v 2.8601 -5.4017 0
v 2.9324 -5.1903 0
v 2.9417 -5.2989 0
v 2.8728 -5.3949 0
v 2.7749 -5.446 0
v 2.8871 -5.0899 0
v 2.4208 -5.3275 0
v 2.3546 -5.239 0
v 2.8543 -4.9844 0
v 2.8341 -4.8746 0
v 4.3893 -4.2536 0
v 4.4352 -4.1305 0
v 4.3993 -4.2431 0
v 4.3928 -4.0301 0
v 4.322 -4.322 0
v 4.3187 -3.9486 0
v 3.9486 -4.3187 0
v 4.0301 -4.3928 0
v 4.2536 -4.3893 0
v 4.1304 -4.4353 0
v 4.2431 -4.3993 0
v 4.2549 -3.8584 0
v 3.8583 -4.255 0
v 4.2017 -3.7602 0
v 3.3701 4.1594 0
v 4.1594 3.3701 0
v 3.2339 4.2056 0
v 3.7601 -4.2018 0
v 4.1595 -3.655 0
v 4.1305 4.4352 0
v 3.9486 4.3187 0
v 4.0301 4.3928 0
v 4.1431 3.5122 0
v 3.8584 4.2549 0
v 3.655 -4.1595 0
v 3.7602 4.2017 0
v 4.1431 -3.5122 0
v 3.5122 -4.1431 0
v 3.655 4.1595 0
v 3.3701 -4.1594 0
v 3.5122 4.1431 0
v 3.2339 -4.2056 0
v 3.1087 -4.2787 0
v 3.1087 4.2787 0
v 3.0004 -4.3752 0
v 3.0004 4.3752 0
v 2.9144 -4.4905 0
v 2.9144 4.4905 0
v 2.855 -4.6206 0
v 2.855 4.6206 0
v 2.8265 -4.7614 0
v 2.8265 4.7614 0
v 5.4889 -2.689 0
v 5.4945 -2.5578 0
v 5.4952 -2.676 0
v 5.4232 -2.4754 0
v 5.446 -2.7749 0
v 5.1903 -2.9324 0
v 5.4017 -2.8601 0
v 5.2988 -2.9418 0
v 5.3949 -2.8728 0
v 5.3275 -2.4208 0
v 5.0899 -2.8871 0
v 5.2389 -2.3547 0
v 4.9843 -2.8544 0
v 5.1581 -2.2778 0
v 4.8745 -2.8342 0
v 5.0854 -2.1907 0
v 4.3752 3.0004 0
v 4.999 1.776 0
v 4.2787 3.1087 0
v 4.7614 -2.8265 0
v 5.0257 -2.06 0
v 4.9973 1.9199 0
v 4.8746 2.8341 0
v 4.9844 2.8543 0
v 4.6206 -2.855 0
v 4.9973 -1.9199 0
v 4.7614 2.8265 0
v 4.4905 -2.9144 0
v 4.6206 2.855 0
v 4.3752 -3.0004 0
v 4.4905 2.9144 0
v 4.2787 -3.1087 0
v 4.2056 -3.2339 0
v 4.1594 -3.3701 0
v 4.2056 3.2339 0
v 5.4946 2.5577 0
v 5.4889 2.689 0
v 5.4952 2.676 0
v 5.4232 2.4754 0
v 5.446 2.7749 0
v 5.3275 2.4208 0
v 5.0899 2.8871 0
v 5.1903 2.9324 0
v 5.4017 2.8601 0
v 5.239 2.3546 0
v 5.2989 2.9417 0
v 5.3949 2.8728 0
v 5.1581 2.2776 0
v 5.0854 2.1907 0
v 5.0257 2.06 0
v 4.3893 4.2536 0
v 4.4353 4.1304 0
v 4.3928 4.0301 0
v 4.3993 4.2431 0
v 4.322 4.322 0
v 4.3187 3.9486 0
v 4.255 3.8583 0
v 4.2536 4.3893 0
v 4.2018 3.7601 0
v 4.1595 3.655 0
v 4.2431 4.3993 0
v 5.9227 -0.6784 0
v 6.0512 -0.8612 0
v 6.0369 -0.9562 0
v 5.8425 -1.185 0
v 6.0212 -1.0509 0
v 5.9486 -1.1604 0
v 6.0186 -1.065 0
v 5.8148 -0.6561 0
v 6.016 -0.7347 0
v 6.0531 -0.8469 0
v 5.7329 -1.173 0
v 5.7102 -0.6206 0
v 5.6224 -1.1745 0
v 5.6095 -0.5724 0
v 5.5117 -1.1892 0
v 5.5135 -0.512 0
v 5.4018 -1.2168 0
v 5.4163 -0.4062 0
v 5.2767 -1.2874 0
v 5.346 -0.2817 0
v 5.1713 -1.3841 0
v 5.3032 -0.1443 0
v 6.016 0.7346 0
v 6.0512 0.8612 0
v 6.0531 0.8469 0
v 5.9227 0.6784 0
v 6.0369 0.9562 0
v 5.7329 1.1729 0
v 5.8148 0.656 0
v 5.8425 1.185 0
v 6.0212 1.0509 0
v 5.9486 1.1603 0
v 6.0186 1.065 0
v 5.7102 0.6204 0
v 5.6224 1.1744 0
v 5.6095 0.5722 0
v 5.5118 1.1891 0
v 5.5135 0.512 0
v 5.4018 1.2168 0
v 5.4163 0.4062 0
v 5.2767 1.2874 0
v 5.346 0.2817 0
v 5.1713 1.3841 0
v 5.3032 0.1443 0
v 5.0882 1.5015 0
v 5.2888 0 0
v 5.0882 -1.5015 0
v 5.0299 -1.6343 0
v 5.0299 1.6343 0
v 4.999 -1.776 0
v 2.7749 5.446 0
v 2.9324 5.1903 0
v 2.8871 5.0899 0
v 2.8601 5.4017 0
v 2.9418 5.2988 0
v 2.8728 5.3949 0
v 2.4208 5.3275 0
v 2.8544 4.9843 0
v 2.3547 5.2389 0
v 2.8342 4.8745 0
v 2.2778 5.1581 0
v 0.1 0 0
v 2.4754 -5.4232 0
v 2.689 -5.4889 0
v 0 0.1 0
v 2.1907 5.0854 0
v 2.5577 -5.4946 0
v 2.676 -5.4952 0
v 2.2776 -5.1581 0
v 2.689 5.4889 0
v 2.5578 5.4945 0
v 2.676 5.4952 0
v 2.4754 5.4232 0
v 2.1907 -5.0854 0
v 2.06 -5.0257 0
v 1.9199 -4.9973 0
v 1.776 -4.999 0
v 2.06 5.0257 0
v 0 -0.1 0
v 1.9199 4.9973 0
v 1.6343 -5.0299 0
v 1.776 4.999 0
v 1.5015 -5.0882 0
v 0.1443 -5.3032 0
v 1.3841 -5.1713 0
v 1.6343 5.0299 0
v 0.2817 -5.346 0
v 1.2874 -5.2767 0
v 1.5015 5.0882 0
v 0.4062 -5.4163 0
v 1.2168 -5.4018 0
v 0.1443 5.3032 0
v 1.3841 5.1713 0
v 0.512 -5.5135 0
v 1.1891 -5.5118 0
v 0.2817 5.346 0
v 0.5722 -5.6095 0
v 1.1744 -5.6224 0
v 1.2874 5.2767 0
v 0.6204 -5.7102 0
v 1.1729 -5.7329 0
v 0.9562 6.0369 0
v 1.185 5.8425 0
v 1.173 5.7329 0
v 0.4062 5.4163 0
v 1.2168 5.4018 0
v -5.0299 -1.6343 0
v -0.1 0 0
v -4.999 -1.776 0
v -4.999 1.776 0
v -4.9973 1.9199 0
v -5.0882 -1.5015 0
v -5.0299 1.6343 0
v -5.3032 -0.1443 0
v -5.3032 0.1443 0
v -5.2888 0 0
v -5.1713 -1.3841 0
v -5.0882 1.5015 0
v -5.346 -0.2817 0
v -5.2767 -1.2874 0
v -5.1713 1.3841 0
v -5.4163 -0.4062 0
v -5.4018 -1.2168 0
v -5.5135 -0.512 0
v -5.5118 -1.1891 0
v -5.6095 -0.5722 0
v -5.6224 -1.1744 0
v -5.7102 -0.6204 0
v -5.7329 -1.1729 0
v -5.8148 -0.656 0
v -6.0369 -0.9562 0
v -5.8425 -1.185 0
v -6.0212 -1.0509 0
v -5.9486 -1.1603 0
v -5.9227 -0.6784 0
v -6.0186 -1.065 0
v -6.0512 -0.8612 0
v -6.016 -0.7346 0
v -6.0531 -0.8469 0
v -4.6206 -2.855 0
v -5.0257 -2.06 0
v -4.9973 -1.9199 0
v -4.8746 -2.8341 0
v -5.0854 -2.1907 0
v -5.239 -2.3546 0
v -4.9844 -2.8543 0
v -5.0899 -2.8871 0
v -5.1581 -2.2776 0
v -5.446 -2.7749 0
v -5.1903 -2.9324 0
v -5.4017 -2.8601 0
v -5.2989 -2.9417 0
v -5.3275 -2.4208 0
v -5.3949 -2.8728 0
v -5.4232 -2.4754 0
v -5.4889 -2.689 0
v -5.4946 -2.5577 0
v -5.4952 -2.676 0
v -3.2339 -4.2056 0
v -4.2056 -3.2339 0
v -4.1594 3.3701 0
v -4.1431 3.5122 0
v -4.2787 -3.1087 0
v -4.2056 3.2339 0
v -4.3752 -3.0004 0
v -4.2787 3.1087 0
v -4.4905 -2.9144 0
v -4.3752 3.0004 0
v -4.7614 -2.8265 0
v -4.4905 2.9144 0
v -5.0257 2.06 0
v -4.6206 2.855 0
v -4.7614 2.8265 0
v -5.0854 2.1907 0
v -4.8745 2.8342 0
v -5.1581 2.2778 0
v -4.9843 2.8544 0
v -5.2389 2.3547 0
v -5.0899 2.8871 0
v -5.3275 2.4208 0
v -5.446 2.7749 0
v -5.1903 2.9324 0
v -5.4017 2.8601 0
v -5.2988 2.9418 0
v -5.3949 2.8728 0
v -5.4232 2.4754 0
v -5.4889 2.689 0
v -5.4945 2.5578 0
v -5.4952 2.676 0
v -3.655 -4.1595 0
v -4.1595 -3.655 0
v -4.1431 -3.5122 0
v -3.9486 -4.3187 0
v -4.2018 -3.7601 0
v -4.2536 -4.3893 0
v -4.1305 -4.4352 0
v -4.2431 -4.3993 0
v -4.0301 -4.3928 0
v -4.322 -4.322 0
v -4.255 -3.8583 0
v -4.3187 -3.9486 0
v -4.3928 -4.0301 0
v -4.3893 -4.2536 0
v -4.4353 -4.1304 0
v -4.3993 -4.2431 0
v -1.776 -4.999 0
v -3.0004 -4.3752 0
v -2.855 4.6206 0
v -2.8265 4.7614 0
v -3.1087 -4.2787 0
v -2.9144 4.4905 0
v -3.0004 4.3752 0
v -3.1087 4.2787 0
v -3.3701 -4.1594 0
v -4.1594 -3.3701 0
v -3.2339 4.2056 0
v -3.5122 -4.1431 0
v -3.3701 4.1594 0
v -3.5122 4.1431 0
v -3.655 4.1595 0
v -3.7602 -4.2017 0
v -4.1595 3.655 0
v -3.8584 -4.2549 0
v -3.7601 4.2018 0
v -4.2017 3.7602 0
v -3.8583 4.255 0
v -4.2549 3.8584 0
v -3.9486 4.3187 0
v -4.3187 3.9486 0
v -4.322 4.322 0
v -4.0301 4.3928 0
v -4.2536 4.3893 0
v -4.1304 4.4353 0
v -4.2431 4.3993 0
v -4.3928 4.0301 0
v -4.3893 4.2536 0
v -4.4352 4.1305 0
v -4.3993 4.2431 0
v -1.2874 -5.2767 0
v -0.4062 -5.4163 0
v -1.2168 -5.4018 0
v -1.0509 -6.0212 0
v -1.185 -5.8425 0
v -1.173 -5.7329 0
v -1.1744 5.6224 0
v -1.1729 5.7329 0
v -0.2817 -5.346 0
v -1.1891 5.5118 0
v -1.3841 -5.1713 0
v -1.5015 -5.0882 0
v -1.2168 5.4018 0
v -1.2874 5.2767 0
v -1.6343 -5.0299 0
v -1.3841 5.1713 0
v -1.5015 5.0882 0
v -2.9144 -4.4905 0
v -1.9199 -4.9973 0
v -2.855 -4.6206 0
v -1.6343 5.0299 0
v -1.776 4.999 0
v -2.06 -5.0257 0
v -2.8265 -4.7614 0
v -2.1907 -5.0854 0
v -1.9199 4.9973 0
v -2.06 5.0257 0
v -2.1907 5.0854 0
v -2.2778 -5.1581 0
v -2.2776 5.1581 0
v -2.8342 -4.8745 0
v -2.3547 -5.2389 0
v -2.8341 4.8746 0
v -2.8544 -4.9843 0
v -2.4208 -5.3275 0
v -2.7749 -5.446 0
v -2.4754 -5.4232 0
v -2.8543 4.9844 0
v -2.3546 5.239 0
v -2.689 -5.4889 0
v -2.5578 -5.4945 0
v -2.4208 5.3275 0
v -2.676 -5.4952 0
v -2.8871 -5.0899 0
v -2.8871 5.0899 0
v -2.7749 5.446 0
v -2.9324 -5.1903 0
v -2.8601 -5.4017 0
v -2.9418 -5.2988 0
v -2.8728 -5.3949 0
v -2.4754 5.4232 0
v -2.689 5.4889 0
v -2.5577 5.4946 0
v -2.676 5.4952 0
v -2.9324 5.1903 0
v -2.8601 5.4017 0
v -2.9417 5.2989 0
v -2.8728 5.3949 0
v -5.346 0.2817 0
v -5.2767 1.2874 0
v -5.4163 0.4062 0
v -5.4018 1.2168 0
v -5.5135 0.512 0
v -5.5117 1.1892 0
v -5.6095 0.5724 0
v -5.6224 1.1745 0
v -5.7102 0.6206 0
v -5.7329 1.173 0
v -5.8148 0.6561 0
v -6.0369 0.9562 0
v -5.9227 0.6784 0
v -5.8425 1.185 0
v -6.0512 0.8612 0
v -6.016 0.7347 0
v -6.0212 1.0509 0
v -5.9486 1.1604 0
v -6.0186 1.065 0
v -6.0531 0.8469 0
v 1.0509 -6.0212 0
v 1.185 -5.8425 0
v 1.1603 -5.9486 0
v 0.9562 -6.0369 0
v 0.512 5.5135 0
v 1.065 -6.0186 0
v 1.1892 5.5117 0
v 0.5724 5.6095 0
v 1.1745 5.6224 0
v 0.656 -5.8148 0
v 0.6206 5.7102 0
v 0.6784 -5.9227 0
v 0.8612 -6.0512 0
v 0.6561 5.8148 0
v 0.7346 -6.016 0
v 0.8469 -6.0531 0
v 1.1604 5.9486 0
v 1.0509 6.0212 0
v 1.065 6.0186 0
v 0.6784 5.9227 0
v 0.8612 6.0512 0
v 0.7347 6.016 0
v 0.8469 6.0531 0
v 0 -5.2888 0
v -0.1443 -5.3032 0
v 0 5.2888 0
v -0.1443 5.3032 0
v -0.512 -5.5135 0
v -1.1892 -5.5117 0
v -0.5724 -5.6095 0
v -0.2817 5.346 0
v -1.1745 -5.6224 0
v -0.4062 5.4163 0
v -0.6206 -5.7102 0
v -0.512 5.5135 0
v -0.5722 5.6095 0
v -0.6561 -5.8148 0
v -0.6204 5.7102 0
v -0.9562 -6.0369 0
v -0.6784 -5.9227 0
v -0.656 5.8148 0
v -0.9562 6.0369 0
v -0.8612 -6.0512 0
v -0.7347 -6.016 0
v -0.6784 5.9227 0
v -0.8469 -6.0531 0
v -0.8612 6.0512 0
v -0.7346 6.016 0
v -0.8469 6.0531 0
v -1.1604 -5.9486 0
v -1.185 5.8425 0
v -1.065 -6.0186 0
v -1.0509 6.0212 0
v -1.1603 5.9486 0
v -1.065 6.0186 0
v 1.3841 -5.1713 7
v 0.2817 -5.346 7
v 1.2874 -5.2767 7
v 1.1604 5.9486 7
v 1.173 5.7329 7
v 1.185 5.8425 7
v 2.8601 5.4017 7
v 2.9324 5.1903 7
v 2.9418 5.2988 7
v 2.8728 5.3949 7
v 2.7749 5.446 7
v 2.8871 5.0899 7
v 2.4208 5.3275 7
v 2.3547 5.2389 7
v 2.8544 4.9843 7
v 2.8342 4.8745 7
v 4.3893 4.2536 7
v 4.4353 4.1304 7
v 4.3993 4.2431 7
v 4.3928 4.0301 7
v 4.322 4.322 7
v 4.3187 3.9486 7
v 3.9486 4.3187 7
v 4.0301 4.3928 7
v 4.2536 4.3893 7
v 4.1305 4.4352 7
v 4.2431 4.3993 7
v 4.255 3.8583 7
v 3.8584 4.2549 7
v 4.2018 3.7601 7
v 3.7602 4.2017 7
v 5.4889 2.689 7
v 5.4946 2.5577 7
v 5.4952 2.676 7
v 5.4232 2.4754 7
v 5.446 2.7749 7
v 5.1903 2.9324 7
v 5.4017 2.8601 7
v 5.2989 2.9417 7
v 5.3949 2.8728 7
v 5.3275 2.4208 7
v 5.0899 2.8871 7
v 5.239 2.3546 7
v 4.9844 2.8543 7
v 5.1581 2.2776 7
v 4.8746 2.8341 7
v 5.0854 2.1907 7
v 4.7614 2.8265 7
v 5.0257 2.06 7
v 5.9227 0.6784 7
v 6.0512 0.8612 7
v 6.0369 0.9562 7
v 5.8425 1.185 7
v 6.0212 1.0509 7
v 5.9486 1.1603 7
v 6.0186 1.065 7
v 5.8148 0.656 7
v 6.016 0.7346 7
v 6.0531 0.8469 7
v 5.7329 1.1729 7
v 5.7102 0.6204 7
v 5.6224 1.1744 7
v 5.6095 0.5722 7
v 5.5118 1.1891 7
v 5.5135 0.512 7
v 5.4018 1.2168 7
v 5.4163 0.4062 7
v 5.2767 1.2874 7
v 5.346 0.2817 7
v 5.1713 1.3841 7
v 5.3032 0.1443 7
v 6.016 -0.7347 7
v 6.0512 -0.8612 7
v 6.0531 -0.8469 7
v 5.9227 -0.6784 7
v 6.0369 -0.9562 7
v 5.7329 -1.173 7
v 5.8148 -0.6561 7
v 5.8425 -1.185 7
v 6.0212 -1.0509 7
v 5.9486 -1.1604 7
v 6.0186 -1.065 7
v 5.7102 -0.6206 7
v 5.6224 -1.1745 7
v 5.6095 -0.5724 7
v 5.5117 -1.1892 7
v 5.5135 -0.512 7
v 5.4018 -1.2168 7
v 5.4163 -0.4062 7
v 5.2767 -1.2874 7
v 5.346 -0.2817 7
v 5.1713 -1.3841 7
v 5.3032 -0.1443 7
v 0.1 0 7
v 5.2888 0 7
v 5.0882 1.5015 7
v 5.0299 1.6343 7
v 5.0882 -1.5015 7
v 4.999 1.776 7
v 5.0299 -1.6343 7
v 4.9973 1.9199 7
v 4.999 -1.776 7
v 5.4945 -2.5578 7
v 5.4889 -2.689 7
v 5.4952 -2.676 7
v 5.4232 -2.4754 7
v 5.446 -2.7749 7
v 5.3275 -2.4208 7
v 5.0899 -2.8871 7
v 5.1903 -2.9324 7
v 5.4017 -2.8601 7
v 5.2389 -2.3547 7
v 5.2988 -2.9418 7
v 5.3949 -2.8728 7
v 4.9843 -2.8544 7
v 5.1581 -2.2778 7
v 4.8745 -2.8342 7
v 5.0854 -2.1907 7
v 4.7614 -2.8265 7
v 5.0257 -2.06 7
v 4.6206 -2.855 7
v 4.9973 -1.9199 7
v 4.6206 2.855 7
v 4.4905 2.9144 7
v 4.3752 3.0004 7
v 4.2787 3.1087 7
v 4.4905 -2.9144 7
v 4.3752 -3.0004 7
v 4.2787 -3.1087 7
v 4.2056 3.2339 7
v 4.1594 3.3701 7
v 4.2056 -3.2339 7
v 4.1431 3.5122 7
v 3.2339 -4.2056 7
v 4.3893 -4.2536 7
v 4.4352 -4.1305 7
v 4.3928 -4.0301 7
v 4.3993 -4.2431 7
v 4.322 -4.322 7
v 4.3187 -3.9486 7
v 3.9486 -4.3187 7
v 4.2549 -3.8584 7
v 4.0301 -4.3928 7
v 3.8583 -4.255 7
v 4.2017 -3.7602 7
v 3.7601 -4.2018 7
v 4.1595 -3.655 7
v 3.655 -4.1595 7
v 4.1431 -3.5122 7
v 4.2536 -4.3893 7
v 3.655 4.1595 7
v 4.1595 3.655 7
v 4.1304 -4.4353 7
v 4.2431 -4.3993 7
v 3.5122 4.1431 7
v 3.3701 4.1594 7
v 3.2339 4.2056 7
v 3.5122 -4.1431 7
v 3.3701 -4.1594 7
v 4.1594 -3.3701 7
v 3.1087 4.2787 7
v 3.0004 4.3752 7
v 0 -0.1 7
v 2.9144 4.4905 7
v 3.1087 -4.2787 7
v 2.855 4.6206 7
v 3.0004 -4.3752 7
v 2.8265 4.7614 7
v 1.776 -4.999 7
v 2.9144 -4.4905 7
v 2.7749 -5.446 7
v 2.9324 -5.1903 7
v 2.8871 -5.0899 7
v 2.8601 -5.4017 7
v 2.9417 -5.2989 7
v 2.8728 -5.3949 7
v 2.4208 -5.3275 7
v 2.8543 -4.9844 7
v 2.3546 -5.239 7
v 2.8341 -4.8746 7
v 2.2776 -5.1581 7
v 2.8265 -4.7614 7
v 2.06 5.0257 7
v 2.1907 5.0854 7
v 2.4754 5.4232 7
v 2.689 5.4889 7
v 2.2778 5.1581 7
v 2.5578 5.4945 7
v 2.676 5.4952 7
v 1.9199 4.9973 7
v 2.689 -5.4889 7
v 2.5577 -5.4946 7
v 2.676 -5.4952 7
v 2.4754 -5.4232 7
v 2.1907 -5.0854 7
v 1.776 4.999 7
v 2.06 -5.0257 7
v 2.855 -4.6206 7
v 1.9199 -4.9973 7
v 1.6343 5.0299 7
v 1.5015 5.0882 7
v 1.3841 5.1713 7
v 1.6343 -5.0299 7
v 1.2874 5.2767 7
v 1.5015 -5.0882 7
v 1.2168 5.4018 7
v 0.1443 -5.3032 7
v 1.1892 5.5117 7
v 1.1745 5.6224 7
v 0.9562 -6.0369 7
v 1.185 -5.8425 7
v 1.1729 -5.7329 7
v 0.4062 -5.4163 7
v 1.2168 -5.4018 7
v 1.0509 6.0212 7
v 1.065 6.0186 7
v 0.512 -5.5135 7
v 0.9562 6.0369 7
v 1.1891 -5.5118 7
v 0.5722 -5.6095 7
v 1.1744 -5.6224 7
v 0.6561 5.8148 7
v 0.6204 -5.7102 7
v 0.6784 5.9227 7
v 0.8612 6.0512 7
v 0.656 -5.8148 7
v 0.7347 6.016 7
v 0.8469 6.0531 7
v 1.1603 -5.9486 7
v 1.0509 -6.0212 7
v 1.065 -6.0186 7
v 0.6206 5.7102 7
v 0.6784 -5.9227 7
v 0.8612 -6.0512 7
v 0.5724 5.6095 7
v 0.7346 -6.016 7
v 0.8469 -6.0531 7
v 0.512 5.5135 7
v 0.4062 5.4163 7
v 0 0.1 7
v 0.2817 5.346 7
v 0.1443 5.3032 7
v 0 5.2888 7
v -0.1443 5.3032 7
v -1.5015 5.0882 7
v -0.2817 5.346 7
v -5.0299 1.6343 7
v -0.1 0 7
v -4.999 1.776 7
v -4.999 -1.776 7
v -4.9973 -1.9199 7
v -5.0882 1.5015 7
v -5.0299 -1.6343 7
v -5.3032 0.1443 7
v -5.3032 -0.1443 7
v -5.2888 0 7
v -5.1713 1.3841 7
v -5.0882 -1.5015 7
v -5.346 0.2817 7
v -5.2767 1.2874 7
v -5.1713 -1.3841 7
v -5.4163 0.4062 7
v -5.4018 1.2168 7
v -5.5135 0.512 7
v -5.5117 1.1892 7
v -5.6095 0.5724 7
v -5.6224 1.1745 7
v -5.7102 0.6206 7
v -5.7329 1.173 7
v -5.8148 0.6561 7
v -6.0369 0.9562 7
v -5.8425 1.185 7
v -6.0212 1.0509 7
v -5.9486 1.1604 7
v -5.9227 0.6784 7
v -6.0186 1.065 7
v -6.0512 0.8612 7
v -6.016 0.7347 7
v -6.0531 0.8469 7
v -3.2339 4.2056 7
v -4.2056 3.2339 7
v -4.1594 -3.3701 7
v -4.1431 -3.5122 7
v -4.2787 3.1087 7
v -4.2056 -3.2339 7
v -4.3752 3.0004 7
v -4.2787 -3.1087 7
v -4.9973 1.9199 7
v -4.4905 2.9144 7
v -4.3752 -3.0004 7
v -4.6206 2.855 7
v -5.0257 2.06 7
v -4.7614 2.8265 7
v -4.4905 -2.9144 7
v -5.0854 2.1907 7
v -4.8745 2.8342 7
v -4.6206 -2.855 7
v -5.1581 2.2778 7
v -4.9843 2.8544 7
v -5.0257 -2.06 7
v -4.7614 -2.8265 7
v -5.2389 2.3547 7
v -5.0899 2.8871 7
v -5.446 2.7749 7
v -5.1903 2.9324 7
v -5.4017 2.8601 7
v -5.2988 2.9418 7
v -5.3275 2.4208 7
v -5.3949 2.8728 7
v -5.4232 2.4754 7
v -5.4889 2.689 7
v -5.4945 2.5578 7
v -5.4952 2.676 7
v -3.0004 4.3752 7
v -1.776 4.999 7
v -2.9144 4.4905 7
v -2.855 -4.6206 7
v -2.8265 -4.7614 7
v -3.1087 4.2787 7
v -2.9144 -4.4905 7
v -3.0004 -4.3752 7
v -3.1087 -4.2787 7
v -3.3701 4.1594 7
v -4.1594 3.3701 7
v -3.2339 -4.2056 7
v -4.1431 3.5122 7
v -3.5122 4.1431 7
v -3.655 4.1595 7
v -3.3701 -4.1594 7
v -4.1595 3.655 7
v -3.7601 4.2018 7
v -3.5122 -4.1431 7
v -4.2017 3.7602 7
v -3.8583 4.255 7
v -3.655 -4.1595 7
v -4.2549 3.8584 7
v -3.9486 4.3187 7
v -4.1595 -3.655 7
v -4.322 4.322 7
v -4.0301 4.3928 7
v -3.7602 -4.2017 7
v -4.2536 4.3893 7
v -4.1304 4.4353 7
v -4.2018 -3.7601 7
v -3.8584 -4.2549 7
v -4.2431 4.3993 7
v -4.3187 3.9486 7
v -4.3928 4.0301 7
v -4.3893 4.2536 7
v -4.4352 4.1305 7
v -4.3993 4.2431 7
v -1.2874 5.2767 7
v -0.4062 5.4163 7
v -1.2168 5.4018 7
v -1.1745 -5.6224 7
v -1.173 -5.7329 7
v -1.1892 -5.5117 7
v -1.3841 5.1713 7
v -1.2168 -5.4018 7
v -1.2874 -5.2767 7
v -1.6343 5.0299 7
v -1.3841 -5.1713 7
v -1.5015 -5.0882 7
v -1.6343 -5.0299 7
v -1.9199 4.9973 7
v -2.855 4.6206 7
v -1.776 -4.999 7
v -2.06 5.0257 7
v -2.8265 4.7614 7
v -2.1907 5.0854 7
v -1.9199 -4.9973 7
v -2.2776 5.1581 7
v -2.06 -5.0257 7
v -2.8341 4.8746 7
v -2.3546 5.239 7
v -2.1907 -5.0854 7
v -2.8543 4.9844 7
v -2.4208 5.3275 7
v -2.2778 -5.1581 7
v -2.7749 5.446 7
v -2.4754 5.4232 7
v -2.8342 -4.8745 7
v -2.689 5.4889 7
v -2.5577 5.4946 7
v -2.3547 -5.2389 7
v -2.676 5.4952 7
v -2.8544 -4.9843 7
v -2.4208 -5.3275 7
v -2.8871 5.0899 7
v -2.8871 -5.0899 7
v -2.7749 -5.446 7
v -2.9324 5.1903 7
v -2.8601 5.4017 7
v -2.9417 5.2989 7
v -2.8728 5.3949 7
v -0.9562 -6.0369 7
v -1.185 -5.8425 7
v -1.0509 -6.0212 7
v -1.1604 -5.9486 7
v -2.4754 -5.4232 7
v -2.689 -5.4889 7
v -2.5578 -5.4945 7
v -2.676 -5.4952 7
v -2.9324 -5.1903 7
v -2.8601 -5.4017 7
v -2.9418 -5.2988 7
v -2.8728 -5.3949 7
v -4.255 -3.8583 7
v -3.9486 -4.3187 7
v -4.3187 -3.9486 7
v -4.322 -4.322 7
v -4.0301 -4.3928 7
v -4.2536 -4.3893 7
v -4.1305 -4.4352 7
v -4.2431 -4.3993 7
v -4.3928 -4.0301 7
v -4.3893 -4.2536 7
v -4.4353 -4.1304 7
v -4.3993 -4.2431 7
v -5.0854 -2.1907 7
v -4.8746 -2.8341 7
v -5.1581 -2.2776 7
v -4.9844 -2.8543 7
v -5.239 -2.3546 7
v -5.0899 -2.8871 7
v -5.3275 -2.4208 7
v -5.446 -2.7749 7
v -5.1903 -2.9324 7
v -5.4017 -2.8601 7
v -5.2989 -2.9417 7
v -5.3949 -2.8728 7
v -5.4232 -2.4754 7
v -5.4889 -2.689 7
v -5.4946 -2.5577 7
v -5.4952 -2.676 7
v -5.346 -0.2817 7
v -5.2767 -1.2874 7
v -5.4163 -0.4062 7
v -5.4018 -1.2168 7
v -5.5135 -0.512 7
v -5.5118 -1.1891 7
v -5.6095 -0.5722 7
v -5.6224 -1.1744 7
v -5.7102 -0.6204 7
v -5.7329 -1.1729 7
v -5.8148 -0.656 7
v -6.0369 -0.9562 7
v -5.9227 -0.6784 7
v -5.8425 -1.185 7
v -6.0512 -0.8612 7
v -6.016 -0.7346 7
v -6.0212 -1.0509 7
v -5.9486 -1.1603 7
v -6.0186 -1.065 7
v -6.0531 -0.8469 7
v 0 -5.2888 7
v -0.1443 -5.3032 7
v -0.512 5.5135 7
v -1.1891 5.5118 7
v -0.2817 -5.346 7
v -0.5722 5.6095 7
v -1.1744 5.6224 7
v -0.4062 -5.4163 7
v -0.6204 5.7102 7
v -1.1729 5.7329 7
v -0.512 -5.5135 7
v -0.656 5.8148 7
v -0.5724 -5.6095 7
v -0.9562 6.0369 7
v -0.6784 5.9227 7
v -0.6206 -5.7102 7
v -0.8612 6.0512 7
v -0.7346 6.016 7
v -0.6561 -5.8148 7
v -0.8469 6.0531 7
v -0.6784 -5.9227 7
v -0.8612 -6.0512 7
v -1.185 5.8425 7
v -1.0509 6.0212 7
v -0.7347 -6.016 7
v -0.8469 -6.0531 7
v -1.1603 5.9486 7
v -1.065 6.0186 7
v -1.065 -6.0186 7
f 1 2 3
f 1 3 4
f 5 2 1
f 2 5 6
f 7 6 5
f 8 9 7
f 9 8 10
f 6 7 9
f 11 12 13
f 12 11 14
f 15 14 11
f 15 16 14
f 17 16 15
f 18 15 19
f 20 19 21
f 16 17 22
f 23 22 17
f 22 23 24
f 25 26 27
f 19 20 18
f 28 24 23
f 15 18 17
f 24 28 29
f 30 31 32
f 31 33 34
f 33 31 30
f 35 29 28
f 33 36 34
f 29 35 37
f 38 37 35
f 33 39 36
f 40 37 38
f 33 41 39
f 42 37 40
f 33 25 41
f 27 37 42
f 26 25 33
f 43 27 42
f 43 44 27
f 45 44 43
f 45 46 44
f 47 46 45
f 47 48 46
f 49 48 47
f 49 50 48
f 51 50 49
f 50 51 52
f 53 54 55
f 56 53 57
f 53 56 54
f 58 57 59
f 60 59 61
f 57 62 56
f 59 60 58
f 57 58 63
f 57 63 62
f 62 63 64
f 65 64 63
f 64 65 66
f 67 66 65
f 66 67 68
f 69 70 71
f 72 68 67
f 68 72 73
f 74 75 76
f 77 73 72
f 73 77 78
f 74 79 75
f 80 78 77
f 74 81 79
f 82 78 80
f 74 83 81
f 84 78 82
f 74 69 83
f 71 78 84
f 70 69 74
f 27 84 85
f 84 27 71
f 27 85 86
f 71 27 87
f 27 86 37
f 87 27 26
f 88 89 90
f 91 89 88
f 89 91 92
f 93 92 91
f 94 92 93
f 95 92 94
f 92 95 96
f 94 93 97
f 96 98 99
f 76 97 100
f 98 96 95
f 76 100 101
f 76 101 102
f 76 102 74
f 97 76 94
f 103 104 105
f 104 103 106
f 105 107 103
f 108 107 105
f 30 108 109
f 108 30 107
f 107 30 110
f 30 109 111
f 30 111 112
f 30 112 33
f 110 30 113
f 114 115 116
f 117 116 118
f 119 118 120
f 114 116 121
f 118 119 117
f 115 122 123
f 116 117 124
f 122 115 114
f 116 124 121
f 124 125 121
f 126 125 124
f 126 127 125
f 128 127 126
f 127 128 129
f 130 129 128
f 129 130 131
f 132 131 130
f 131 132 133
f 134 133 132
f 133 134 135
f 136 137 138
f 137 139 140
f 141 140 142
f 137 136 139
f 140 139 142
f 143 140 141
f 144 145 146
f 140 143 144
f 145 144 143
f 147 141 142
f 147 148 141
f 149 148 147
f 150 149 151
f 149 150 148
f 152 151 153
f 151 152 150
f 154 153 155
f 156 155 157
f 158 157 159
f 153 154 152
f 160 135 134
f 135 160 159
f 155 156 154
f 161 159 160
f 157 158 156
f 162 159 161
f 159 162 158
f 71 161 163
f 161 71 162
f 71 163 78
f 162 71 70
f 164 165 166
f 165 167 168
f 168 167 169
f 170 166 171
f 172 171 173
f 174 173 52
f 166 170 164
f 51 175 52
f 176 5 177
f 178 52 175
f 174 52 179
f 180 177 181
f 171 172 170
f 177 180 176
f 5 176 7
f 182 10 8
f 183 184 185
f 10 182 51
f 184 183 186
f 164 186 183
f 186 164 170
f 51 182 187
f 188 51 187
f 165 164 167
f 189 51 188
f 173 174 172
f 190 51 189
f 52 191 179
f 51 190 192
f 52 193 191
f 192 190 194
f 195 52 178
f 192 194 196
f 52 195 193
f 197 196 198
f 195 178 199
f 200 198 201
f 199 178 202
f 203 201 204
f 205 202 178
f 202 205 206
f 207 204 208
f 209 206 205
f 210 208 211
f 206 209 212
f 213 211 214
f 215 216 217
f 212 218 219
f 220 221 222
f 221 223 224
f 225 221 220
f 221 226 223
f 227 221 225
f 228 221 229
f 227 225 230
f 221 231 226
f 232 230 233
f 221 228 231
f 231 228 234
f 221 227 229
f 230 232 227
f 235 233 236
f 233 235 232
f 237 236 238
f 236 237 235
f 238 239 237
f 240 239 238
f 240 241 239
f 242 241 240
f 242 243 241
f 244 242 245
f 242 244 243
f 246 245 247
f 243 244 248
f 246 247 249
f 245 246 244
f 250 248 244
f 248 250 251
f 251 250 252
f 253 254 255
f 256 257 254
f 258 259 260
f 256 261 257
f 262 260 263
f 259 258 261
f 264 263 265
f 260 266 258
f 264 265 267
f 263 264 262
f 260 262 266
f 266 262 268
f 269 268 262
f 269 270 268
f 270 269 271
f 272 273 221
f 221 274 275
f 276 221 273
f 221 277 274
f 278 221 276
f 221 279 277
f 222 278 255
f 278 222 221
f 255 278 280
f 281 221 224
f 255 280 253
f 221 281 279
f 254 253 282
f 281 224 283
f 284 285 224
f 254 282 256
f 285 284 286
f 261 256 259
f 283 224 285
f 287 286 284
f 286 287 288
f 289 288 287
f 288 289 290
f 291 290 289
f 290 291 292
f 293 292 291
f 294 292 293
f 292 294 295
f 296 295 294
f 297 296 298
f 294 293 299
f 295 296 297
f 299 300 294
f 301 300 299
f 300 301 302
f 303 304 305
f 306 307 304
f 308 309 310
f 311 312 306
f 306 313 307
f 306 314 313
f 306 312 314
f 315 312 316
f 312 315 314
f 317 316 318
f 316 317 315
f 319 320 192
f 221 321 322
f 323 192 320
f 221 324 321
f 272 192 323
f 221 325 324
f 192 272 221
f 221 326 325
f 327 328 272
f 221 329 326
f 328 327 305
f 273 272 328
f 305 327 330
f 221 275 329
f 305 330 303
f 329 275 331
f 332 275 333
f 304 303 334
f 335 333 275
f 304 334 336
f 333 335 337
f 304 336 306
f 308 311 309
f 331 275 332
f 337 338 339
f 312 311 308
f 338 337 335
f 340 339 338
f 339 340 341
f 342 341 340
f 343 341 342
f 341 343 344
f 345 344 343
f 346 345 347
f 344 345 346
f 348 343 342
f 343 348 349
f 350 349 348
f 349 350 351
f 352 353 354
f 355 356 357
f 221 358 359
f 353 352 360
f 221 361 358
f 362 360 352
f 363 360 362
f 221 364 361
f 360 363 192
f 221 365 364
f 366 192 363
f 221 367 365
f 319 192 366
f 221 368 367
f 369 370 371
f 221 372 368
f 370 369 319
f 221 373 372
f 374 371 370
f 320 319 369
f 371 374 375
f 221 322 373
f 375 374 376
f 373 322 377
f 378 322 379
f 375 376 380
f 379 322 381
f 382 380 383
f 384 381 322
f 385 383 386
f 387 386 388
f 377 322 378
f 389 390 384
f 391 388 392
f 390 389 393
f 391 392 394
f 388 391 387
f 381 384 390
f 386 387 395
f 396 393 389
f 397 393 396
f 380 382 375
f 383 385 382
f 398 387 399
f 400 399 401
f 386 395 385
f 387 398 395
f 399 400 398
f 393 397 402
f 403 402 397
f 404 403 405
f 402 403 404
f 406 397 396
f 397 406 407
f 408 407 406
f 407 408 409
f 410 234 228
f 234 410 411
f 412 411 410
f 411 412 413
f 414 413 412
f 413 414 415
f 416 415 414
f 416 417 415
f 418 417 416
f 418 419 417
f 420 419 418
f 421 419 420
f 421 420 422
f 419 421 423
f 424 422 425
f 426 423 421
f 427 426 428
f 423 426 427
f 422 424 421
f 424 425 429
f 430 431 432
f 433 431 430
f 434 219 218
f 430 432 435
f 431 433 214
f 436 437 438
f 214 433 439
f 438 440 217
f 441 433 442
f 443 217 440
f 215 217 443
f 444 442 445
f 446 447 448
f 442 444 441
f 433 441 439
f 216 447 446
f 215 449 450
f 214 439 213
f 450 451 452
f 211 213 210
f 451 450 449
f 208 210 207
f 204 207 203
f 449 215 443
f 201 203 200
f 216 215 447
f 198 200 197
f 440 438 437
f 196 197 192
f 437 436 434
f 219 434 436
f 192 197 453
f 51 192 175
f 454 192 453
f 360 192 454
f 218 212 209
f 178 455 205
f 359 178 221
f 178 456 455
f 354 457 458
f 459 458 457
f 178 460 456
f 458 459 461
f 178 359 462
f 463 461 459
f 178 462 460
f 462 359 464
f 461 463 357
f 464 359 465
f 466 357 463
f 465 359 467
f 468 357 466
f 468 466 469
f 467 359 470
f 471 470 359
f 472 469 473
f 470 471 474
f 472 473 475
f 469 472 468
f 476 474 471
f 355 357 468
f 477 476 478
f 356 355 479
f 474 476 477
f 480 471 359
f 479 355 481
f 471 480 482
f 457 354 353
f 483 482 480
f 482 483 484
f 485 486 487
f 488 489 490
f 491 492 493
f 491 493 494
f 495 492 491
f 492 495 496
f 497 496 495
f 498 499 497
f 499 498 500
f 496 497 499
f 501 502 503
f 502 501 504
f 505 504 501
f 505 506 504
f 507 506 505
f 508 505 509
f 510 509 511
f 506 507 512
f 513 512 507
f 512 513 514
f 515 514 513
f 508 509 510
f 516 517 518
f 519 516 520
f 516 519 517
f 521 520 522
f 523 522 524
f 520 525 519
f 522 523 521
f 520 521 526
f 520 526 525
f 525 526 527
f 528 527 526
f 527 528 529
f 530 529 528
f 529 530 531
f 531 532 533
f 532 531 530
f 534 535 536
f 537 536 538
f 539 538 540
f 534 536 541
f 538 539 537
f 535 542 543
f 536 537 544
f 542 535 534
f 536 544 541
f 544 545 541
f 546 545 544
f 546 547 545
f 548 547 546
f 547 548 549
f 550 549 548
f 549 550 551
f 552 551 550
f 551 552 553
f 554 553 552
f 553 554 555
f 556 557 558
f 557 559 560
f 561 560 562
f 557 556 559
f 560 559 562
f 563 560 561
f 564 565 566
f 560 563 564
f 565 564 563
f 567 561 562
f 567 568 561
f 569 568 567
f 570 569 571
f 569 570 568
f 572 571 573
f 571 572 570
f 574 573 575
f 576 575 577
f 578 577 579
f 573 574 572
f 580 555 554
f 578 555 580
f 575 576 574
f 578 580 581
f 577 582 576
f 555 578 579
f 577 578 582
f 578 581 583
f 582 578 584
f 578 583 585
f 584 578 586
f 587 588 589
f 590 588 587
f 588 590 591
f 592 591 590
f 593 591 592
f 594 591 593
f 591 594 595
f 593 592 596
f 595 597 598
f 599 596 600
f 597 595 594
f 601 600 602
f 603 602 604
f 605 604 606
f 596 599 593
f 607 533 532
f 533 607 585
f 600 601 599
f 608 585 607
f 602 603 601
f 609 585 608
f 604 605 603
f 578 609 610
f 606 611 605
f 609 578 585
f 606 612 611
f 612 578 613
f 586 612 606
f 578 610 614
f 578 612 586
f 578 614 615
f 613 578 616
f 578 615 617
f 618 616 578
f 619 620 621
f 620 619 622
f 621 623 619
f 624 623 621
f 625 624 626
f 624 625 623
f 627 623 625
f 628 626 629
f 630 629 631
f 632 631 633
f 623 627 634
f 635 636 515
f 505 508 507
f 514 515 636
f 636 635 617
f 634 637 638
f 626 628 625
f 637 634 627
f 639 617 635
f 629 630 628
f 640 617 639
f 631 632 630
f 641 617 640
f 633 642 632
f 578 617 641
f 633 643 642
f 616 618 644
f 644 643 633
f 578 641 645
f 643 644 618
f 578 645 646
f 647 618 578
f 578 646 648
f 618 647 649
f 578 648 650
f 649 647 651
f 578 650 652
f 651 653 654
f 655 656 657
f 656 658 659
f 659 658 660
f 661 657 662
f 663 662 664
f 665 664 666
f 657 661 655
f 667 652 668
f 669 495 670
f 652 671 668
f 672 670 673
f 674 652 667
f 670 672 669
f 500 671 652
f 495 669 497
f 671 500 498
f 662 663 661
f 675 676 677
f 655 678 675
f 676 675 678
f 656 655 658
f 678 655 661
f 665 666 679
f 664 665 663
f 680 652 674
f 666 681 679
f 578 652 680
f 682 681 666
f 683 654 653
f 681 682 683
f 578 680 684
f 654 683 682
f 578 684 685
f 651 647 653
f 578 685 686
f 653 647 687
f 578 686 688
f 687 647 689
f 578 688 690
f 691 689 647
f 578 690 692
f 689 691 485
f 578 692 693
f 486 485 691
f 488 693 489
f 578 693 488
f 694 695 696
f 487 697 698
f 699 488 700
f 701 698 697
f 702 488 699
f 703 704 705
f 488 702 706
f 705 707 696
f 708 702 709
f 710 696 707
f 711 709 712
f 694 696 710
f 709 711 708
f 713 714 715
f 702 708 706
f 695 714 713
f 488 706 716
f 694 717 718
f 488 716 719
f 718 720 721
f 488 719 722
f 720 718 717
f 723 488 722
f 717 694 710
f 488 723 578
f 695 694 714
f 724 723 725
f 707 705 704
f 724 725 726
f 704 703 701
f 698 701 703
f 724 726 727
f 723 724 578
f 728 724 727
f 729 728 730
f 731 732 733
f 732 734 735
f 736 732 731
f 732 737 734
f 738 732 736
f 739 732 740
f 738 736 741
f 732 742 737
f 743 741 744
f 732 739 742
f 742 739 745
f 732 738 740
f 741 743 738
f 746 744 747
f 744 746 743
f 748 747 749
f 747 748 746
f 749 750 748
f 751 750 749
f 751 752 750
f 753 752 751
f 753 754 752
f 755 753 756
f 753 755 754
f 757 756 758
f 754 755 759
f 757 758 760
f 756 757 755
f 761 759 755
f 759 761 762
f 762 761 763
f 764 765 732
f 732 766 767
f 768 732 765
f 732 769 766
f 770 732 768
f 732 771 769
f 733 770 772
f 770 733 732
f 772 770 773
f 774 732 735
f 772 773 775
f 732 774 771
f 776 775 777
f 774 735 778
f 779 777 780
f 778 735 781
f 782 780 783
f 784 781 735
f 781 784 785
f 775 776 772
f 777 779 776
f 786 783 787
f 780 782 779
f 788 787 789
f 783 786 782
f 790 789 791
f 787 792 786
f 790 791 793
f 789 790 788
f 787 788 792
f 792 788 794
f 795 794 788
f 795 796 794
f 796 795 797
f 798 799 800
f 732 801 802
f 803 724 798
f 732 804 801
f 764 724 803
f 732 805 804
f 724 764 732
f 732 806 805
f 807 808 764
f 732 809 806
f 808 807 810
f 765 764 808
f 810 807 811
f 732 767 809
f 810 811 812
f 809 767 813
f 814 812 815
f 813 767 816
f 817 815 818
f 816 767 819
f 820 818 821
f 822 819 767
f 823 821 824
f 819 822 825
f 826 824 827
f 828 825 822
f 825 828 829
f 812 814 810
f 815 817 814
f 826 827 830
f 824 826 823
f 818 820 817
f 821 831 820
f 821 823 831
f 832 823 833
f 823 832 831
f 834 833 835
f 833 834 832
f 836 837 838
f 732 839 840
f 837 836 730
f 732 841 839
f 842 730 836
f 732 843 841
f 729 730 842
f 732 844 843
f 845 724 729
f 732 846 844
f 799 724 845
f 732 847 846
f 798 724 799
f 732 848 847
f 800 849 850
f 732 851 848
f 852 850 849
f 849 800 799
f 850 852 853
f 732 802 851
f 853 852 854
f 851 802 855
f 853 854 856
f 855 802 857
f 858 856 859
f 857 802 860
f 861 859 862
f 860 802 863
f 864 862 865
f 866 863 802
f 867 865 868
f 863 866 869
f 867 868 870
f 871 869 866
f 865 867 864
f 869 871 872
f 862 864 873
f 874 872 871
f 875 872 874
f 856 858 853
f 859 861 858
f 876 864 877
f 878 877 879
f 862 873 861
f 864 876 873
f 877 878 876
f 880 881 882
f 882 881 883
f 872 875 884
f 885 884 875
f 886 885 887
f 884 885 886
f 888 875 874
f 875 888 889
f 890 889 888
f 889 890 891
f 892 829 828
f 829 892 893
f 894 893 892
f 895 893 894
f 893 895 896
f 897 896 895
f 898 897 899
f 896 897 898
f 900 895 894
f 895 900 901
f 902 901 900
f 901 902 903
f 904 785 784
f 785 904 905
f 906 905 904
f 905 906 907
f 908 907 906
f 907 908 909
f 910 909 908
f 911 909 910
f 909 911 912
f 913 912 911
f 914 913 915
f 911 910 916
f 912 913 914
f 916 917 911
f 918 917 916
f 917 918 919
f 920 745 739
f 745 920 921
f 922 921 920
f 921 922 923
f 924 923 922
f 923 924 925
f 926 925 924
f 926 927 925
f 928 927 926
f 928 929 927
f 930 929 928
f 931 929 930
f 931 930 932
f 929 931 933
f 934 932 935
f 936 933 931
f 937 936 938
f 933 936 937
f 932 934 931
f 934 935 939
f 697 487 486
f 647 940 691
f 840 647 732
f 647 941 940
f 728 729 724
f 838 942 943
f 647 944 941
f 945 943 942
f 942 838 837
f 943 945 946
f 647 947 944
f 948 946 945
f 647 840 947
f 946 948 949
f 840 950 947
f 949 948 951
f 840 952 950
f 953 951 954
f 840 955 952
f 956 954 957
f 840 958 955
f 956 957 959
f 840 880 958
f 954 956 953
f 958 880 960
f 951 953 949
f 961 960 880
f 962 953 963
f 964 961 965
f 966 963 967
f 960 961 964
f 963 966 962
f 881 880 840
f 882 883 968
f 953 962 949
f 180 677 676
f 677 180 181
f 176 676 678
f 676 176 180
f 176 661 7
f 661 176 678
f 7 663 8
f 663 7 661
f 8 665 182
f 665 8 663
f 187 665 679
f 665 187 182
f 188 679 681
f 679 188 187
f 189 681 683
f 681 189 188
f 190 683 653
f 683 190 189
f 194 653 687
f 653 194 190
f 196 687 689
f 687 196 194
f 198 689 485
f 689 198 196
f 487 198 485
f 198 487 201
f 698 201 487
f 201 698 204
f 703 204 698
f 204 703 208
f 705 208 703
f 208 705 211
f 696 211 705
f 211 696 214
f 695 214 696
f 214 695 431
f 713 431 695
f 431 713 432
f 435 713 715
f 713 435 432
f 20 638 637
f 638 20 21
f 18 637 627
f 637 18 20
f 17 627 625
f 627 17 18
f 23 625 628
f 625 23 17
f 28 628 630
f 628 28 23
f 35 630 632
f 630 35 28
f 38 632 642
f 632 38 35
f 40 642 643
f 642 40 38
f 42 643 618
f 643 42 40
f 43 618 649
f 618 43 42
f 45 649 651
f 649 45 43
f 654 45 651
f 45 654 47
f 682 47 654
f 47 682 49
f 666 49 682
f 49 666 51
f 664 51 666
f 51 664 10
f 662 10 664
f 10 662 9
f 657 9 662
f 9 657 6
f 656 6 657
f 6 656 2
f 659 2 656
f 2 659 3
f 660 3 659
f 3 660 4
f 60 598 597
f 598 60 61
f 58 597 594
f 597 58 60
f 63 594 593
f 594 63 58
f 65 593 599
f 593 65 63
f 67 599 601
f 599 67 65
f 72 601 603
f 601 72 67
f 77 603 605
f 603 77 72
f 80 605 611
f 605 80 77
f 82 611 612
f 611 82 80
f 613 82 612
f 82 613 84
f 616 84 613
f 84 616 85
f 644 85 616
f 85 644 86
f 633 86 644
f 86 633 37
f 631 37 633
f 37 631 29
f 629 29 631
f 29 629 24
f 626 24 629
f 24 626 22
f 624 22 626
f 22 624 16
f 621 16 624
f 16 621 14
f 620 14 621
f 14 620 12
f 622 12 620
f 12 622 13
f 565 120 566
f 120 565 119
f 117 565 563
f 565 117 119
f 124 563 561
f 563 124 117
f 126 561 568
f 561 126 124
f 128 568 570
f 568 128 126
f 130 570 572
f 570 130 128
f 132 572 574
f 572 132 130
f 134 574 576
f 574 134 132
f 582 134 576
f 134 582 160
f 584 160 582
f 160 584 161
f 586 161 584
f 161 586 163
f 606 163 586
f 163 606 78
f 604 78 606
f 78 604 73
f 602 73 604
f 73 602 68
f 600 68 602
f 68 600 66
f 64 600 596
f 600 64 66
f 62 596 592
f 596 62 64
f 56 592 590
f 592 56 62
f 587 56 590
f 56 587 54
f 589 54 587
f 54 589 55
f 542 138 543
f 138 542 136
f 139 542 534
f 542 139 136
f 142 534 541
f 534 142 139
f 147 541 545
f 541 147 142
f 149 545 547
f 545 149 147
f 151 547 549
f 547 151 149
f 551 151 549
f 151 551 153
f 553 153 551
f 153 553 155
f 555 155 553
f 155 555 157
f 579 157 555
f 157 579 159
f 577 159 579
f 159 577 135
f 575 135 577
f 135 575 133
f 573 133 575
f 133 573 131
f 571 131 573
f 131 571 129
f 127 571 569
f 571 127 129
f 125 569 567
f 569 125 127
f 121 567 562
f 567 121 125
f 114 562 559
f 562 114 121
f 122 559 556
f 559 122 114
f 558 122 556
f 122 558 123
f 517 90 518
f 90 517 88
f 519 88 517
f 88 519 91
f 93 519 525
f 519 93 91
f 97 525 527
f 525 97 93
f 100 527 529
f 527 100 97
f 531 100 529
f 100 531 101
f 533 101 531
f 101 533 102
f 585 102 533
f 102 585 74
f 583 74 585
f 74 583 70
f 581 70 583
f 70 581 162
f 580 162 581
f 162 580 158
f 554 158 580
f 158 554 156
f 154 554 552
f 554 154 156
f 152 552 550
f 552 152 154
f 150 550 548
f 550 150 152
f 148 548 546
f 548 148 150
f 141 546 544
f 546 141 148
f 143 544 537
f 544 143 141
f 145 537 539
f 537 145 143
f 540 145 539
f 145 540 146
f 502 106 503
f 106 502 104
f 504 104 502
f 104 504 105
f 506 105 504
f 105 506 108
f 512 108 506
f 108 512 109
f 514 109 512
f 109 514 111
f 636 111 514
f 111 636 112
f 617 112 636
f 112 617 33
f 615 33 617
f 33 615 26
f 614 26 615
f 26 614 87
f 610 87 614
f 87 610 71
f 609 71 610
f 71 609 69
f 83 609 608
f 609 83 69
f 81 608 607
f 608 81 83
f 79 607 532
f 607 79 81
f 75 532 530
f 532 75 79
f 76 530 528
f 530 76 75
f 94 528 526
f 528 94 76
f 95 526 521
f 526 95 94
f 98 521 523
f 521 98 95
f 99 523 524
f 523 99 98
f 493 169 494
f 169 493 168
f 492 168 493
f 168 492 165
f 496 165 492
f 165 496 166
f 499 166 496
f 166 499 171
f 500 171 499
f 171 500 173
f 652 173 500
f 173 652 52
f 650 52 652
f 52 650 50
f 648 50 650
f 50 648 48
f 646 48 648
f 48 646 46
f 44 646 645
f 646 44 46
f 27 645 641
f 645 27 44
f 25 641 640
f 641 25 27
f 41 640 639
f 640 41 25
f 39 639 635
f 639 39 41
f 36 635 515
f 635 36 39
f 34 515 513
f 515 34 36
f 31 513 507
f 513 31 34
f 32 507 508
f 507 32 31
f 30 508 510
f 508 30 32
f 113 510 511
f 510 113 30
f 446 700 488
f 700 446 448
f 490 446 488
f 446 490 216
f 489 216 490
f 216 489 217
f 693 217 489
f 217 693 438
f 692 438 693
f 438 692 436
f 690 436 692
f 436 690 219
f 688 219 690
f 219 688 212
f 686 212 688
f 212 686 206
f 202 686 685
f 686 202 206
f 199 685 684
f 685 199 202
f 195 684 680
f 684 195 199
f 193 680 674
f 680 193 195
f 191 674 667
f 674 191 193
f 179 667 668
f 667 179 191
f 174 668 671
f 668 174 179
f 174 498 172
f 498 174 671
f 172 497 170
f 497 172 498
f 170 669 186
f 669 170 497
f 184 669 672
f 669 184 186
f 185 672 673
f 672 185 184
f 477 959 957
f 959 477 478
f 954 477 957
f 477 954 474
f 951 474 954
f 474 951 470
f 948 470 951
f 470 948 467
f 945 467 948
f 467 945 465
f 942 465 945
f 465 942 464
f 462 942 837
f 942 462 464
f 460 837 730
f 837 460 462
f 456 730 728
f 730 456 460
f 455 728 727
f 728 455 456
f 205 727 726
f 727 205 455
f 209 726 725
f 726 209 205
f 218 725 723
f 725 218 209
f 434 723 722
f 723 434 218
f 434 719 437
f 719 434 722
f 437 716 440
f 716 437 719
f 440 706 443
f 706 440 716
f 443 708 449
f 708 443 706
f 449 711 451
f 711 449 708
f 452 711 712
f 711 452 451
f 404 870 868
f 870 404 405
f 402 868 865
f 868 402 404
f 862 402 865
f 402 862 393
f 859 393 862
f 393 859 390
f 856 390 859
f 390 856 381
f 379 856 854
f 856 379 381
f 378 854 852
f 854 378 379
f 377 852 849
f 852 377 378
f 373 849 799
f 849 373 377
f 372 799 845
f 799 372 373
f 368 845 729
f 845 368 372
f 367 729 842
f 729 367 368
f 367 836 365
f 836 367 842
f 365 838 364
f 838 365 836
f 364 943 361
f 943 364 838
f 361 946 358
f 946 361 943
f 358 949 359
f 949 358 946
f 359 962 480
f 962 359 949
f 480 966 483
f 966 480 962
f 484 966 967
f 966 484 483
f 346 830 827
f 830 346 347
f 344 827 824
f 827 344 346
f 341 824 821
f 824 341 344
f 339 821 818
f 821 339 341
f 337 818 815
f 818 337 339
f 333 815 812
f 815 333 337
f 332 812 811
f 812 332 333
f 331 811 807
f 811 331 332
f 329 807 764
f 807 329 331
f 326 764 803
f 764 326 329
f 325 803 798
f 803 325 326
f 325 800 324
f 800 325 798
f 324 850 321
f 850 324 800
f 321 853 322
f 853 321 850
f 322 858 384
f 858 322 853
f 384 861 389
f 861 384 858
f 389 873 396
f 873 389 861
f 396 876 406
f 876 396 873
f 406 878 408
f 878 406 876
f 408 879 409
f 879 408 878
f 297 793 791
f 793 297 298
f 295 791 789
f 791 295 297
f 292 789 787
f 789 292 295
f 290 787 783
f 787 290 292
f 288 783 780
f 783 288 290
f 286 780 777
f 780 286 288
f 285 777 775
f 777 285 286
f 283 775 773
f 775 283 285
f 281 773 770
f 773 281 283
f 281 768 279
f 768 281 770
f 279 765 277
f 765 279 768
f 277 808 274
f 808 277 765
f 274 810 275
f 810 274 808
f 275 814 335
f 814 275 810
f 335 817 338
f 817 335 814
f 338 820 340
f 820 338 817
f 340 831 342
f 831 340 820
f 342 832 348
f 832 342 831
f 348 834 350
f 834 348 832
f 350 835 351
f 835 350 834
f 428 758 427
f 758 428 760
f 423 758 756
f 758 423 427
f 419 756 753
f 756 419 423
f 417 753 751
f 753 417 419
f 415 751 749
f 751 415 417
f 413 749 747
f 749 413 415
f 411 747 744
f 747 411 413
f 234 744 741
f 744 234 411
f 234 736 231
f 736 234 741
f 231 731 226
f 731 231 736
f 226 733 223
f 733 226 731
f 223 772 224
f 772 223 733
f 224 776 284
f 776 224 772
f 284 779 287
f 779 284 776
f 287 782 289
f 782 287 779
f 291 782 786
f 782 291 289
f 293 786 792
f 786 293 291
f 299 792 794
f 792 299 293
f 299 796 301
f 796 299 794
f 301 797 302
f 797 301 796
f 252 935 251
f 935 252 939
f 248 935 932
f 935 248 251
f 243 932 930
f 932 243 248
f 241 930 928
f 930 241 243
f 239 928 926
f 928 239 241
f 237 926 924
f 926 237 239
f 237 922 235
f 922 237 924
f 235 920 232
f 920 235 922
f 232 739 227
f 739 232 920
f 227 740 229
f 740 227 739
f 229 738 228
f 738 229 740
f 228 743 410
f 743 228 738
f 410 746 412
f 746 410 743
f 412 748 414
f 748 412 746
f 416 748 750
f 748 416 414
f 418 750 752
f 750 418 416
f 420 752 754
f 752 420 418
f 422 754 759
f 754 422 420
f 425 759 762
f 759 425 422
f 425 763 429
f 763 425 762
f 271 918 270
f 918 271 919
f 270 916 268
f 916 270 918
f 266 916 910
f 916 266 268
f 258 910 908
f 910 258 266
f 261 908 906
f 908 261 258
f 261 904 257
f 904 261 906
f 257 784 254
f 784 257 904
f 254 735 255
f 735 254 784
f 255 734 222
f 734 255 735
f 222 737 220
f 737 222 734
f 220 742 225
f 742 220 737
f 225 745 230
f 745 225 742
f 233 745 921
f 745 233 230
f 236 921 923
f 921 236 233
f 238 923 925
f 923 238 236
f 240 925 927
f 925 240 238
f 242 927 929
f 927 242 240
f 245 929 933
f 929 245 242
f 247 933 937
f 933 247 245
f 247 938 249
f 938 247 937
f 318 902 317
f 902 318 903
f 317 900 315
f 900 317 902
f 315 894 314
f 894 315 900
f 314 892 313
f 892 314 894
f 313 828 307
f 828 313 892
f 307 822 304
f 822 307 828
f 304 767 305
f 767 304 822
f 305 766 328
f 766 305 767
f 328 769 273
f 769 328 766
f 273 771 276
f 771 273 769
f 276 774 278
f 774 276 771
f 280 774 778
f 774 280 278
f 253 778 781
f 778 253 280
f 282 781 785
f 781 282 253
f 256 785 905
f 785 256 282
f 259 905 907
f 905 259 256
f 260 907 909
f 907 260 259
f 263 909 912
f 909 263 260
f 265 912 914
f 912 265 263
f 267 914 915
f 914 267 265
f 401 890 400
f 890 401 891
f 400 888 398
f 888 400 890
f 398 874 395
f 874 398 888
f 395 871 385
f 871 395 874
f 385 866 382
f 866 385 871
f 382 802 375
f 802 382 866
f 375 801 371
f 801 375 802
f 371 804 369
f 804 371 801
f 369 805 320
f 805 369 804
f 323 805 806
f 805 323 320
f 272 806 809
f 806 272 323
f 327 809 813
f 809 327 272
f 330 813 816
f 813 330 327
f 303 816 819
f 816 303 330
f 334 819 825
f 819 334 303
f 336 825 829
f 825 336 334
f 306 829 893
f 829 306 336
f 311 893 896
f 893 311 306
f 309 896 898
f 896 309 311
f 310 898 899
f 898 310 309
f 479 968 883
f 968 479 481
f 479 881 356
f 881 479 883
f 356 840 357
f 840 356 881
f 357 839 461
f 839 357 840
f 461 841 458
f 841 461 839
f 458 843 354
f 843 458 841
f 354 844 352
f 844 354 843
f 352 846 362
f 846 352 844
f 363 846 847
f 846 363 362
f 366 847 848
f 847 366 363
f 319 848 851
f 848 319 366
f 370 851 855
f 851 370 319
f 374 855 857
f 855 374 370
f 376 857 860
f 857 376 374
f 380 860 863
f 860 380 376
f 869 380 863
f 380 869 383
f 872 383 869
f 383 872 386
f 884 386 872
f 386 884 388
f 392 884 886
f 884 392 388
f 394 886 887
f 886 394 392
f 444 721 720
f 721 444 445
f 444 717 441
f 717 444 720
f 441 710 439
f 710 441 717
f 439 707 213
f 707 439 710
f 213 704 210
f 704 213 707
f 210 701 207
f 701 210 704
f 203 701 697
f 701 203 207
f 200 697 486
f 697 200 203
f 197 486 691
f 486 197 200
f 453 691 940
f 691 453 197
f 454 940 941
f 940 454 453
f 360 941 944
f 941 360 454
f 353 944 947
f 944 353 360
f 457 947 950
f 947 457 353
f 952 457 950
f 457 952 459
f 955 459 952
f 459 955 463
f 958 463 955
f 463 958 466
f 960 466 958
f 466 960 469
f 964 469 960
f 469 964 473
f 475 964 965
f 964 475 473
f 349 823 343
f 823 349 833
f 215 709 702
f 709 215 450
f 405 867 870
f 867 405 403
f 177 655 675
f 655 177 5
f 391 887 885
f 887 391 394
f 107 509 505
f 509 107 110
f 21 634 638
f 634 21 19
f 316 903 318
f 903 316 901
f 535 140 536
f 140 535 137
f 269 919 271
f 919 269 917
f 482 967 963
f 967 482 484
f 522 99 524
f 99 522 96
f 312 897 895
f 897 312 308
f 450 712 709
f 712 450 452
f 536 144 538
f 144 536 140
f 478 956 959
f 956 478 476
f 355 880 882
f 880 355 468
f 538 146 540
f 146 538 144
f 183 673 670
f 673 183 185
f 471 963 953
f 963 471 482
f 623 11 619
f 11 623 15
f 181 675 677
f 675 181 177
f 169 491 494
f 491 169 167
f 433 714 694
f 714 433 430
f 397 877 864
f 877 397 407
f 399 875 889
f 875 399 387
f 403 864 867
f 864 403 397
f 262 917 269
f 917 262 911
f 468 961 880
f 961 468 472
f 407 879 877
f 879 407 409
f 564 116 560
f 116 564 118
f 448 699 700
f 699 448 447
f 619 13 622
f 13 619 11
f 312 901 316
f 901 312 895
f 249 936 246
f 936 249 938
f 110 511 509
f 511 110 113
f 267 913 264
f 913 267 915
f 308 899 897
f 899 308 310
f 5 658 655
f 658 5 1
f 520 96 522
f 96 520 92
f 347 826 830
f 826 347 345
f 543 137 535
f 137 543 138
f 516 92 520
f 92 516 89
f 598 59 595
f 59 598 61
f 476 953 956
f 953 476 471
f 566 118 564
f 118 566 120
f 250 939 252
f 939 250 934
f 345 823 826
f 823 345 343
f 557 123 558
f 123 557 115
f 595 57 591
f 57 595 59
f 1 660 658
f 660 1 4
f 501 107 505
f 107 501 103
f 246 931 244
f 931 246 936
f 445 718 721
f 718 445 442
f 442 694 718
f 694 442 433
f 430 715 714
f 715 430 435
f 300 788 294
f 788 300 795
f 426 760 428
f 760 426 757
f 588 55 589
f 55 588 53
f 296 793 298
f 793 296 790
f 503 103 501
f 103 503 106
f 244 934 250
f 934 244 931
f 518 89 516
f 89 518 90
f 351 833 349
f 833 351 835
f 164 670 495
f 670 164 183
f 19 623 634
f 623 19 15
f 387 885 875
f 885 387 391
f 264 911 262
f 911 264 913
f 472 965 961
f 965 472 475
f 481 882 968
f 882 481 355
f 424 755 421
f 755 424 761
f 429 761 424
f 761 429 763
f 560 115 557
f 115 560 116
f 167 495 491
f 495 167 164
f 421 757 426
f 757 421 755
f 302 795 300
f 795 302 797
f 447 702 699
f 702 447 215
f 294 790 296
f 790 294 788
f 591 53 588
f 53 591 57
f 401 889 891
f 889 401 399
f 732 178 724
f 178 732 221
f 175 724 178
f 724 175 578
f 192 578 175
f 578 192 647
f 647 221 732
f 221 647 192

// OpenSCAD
$fn = 50;

use <../../../../pulley_gt2.scad>;

difference() {
	union() {
		pulley_gt2(depth = 7, number_of_teeth = 20);
	}
	union();
}
